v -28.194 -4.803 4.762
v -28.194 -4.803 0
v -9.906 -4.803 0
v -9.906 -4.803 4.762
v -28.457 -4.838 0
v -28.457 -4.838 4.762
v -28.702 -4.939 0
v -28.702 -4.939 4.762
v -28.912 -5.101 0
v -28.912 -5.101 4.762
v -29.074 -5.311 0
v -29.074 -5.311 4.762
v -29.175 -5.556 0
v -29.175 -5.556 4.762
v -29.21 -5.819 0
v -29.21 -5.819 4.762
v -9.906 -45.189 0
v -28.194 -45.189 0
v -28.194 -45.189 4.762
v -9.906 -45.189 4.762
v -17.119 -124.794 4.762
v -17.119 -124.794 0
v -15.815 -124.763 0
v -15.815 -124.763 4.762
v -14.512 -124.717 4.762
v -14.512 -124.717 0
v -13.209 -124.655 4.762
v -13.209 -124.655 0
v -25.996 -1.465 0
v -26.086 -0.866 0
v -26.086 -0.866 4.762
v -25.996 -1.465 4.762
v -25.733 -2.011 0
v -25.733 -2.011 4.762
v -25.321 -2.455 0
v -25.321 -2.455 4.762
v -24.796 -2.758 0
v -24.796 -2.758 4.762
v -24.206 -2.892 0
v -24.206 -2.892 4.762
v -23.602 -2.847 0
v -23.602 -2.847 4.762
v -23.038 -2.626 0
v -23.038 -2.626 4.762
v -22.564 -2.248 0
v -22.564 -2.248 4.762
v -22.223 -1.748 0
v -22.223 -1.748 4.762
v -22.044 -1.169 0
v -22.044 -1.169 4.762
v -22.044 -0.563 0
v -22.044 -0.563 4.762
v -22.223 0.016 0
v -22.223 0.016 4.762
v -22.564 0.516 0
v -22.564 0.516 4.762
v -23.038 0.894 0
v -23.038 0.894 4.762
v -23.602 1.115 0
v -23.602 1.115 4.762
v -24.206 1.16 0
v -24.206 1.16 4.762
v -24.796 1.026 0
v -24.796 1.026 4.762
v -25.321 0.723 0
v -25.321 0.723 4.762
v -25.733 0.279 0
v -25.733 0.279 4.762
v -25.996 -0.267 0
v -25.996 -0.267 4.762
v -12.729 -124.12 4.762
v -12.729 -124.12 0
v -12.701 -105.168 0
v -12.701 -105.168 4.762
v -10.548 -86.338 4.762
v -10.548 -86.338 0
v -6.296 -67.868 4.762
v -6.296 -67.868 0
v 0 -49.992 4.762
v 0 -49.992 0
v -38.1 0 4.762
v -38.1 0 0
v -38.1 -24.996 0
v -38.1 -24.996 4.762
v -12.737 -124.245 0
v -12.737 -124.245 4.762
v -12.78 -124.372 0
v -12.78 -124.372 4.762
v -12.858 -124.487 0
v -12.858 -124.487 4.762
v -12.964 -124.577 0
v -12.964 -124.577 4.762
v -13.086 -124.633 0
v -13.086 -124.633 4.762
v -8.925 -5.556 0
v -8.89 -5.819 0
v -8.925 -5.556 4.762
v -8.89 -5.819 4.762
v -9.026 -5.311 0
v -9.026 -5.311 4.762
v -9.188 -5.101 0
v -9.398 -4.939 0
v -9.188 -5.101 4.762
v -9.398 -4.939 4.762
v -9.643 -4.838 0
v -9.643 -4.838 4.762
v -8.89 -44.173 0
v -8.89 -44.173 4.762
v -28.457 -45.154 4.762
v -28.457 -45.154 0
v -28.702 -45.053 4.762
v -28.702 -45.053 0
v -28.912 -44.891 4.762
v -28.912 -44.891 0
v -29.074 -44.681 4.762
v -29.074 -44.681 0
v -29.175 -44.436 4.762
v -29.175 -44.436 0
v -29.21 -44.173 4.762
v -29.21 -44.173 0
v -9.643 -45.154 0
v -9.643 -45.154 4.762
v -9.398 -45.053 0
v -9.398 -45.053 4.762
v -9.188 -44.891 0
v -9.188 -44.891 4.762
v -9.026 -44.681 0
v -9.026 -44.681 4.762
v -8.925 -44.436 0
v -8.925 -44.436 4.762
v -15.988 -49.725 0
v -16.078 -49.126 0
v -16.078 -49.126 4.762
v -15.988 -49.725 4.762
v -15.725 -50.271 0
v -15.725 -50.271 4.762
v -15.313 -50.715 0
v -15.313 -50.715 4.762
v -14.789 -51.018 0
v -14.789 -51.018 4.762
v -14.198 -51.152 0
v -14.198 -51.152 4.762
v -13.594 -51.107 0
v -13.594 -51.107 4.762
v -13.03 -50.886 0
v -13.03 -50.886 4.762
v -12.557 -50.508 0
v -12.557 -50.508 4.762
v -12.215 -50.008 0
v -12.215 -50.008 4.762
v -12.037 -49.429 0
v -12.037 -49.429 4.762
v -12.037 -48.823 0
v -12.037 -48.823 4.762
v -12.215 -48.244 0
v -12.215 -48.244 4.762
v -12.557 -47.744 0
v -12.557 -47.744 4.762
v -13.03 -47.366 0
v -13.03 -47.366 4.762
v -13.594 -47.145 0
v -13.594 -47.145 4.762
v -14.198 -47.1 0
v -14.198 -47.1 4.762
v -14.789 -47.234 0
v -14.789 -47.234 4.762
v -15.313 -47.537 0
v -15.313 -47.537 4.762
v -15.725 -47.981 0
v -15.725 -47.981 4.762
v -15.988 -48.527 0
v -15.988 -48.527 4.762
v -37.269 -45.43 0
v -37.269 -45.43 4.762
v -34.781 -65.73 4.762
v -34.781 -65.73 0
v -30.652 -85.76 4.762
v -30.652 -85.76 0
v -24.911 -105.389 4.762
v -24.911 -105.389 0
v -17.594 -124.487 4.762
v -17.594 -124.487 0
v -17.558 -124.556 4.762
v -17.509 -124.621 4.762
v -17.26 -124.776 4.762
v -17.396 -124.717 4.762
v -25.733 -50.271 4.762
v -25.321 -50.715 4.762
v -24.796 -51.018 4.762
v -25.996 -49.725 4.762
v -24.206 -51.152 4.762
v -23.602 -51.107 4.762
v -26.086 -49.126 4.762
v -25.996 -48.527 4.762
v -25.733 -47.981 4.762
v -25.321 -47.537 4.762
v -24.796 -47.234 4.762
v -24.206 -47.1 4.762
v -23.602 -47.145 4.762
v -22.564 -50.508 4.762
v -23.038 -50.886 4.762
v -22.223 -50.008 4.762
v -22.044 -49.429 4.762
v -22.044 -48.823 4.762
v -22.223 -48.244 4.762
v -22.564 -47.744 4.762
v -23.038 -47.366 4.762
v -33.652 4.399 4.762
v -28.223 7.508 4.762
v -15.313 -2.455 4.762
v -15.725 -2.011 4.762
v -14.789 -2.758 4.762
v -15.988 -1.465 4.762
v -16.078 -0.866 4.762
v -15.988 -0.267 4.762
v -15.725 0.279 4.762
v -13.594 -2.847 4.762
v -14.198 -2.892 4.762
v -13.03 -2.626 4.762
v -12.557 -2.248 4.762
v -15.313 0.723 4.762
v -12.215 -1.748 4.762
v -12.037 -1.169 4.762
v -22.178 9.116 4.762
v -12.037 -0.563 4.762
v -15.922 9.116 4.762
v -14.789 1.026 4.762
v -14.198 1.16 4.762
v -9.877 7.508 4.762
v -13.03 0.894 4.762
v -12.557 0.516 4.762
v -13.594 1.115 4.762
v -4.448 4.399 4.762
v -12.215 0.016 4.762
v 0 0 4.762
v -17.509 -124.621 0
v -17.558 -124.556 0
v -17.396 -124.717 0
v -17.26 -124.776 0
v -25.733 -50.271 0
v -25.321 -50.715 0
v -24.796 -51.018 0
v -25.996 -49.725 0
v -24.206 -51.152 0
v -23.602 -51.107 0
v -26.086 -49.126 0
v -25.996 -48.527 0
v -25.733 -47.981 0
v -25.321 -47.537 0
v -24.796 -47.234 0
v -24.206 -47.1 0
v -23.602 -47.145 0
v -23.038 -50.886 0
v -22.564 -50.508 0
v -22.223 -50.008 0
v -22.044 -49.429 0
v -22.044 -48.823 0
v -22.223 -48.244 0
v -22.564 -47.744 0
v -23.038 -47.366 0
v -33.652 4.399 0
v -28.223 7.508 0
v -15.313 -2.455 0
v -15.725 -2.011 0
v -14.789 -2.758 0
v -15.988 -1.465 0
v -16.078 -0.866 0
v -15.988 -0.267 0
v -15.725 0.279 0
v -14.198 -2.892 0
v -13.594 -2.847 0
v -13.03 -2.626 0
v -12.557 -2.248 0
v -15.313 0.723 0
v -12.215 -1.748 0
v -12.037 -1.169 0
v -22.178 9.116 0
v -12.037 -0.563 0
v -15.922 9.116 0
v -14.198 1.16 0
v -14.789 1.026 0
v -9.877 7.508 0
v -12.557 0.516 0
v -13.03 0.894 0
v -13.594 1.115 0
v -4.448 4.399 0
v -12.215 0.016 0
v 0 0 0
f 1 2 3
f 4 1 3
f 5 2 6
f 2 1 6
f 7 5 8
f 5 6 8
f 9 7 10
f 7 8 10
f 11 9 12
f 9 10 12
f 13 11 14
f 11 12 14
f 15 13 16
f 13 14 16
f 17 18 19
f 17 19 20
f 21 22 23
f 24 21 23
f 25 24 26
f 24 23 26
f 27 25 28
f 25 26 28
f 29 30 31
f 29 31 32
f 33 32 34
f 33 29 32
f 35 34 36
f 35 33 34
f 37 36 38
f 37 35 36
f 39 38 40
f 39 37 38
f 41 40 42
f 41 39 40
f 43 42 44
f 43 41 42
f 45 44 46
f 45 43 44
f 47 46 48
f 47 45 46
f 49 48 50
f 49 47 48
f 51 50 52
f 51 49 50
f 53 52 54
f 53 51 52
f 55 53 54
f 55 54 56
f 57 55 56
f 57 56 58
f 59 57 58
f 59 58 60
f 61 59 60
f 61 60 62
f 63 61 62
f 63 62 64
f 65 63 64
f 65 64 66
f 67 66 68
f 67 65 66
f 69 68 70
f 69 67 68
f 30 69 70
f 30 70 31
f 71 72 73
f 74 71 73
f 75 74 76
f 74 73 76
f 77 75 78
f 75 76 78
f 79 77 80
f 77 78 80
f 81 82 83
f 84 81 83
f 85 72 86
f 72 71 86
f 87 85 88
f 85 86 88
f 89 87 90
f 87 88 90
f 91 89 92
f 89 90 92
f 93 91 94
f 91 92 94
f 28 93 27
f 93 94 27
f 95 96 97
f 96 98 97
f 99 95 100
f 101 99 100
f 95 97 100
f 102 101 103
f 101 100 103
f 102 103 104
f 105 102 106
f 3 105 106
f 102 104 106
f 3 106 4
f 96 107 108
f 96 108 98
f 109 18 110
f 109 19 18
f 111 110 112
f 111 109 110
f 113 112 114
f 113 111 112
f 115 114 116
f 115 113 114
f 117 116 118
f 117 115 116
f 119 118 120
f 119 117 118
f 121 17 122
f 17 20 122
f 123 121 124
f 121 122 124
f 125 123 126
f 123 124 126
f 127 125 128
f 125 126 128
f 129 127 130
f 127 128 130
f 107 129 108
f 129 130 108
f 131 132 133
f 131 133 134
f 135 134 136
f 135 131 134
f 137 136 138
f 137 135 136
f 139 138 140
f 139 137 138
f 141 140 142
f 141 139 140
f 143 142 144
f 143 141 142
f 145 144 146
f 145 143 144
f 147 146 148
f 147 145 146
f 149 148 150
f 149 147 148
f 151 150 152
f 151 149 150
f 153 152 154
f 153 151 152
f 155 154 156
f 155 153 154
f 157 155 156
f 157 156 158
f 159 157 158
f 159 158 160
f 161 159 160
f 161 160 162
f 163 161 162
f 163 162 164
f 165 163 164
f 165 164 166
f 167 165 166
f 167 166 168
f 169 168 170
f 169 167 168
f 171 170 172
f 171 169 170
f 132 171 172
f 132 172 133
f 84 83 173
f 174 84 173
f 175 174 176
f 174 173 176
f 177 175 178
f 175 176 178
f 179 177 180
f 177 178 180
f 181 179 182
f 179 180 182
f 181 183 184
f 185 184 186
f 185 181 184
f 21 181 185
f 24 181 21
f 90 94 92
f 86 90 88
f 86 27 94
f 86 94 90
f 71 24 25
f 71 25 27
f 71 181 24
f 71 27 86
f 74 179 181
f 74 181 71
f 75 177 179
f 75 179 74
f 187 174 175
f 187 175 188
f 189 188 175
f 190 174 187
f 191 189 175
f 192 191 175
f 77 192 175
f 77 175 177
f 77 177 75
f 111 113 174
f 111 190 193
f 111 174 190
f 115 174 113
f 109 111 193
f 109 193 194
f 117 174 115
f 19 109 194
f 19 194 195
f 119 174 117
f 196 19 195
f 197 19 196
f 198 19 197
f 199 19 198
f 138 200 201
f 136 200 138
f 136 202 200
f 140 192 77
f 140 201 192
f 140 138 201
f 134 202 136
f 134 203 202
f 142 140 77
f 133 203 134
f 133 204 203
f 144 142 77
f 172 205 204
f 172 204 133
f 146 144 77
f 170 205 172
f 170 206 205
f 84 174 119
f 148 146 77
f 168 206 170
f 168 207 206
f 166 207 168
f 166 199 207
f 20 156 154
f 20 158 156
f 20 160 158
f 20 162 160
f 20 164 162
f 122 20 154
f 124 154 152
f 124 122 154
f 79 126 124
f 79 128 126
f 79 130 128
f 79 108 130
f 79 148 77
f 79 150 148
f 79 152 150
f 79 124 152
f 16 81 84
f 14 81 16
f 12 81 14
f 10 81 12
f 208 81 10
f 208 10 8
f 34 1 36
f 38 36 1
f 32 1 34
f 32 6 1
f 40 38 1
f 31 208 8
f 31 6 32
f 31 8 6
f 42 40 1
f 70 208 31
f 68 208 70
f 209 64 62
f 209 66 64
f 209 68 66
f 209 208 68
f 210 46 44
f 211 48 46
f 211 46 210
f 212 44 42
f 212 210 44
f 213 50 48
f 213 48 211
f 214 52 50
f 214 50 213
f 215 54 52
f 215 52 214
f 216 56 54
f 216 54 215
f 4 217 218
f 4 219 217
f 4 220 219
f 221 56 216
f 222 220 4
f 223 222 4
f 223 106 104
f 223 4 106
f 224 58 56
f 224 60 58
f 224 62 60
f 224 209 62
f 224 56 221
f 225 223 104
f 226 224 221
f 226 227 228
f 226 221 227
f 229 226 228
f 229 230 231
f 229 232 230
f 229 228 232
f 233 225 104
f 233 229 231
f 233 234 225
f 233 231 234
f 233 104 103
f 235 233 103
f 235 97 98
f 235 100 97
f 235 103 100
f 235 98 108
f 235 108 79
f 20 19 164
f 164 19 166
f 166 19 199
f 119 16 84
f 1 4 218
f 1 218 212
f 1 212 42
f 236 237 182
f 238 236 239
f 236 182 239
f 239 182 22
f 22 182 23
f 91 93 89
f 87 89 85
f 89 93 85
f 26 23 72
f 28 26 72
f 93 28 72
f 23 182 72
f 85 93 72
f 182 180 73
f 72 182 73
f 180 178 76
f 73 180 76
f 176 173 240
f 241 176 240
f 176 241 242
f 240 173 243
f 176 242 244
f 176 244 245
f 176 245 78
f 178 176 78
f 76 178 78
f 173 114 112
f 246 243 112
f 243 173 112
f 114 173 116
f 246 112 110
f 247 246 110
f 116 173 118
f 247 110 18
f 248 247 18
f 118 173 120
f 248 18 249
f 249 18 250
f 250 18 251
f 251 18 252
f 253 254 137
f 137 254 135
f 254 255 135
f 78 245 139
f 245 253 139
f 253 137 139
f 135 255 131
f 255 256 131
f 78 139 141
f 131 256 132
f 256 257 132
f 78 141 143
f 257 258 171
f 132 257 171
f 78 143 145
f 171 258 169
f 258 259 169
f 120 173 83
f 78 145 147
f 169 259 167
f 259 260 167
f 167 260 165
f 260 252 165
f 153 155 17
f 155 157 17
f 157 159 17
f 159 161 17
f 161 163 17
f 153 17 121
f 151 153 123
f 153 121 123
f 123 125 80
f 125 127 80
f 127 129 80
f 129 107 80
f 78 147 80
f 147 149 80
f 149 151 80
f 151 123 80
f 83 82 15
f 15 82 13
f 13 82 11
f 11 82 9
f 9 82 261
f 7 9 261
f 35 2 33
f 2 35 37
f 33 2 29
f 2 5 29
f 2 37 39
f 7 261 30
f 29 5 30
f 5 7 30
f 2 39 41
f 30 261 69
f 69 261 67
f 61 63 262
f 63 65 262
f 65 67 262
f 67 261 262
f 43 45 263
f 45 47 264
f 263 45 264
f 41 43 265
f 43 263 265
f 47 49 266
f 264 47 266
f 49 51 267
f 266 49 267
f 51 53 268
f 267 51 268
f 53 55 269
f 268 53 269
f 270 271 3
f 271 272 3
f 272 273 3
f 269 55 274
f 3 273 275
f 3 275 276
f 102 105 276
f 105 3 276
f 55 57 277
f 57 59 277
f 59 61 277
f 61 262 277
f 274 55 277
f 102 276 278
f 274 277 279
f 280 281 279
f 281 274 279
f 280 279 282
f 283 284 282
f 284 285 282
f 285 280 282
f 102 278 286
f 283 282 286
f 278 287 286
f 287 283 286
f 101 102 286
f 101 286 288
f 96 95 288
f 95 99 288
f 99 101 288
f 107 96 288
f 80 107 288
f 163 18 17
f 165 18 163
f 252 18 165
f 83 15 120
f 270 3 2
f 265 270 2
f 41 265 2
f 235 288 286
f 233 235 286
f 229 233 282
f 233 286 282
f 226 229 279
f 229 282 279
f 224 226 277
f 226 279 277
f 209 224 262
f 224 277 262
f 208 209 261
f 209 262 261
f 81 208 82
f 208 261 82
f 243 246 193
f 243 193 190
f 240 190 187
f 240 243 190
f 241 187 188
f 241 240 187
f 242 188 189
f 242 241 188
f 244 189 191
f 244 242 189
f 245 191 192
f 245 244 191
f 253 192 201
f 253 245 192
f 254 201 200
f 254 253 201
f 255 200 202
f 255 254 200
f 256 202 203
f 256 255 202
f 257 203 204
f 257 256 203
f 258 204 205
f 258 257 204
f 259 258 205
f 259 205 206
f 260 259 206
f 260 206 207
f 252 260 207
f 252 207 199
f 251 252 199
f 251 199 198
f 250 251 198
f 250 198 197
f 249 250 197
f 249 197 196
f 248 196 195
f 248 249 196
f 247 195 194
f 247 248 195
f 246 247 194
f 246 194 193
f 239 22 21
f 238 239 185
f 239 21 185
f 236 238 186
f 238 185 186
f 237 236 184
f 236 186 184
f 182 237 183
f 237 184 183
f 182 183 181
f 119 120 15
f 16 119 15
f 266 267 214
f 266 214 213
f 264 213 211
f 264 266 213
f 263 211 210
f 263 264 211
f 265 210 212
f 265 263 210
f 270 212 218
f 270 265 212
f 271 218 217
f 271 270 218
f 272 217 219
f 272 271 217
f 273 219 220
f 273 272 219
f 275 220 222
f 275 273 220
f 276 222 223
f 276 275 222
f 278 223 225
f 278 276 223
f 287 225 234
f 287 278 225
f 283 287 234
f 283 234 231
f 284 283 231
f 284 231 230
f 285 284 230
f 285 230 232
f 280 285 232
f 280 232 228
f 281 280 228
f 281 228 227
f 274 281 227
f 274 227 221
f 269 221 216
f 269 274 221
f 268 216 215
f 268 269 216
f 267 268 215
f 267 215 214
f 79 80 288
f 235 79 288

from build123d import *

# Parameters (mm, degrees)
SKETCH1_R           = 2.032
SKETCH1_W           = 20.32
SKETCH1_H           = 40.386
BOSS_EXTRUDE1_DEPTH = 4.7625
FILLET1_R           = 1.016
FILLET2_R           = 0.508


with BuildPart() as part:
    # Sketch1 → Boss-Extrude1 (new body)
    with BuildSketch(Plane.XY):
        with BuildLine():
            Line((0, -49.992035626), (0, 0))
            ThreePointArc((0, 0), (-19.05, 9.319382187), (-38.1, 0))
            Line((-38.1, 0), (-38.1, -24.996017813))
            ThreePointArc((-38.1, -24.996017813), (-32.885821078, -75.953581503), (-17.459395355, -124.799117107))
            ThreePointArc((-17.459395355, -124.799117107), (-15.078767061, -124.73890948), (-12.7, -124.627180771))
            ThreePointArc((-12.7, -124.627180771), (-10.590712033, -86.588003883), (0, -49.992035626))
        make_face()
        with Locations(Location((-14.0462, -0.866017813, 0), (0, 0, 180))):
            Circle(SKETCH1_R, mode=Mode.SUBTRACT)
        with Locations(Location((-24.0538, -0.866017813, 0), (0, 0, 180))):
            Circle(SKETCH1_R, mode=Mode.SUBTRACT)
        with Locations(Location((-24.0538, -49.126017813, 0), (0, 0, 180))):
            Circle(SKETCH1_R, mode=Mode.SUBTRACT)
        with Locations(Location((-14.0462, -49.126017813, 0), (0, 0, 180))):
            Circle(SKETCH1_R, mode=Mode.SUBTRACT)
        with Locations((-19.05, -24.996017813)):
            Rectangle(SKETCH1_W, SKETCH1_H, mode=Mode.SUBTRACT)
    extrude(amount=BOSS_EXTRUDE1_DEPTH)

    # Fillet1
    fillet1_edges = [part.edges().sort_by_distance(p)[0] for p in [
        (-8.89, -45.189017813, 2.38125),
        (-8.89, -4.803017813, 2.38125),
        (-29.21, -4.803017813, 2.38125),
        (-29.21, -45.189017813, 2.38125),
    ]]
    fillet(fillet1_edges, radius=FILLET1_R)

    # Fillet2
    fillet2_edges = [part.edges().sort_by_distance(p)[0] for p in [
        (-12.7, -124.627180771, 2.38125),
        (-17.459395355, -124.799117107, 2.38125),
    ]]
    fillet(fillet2_edges, radius=FILLET2_R)


solid = part.part
